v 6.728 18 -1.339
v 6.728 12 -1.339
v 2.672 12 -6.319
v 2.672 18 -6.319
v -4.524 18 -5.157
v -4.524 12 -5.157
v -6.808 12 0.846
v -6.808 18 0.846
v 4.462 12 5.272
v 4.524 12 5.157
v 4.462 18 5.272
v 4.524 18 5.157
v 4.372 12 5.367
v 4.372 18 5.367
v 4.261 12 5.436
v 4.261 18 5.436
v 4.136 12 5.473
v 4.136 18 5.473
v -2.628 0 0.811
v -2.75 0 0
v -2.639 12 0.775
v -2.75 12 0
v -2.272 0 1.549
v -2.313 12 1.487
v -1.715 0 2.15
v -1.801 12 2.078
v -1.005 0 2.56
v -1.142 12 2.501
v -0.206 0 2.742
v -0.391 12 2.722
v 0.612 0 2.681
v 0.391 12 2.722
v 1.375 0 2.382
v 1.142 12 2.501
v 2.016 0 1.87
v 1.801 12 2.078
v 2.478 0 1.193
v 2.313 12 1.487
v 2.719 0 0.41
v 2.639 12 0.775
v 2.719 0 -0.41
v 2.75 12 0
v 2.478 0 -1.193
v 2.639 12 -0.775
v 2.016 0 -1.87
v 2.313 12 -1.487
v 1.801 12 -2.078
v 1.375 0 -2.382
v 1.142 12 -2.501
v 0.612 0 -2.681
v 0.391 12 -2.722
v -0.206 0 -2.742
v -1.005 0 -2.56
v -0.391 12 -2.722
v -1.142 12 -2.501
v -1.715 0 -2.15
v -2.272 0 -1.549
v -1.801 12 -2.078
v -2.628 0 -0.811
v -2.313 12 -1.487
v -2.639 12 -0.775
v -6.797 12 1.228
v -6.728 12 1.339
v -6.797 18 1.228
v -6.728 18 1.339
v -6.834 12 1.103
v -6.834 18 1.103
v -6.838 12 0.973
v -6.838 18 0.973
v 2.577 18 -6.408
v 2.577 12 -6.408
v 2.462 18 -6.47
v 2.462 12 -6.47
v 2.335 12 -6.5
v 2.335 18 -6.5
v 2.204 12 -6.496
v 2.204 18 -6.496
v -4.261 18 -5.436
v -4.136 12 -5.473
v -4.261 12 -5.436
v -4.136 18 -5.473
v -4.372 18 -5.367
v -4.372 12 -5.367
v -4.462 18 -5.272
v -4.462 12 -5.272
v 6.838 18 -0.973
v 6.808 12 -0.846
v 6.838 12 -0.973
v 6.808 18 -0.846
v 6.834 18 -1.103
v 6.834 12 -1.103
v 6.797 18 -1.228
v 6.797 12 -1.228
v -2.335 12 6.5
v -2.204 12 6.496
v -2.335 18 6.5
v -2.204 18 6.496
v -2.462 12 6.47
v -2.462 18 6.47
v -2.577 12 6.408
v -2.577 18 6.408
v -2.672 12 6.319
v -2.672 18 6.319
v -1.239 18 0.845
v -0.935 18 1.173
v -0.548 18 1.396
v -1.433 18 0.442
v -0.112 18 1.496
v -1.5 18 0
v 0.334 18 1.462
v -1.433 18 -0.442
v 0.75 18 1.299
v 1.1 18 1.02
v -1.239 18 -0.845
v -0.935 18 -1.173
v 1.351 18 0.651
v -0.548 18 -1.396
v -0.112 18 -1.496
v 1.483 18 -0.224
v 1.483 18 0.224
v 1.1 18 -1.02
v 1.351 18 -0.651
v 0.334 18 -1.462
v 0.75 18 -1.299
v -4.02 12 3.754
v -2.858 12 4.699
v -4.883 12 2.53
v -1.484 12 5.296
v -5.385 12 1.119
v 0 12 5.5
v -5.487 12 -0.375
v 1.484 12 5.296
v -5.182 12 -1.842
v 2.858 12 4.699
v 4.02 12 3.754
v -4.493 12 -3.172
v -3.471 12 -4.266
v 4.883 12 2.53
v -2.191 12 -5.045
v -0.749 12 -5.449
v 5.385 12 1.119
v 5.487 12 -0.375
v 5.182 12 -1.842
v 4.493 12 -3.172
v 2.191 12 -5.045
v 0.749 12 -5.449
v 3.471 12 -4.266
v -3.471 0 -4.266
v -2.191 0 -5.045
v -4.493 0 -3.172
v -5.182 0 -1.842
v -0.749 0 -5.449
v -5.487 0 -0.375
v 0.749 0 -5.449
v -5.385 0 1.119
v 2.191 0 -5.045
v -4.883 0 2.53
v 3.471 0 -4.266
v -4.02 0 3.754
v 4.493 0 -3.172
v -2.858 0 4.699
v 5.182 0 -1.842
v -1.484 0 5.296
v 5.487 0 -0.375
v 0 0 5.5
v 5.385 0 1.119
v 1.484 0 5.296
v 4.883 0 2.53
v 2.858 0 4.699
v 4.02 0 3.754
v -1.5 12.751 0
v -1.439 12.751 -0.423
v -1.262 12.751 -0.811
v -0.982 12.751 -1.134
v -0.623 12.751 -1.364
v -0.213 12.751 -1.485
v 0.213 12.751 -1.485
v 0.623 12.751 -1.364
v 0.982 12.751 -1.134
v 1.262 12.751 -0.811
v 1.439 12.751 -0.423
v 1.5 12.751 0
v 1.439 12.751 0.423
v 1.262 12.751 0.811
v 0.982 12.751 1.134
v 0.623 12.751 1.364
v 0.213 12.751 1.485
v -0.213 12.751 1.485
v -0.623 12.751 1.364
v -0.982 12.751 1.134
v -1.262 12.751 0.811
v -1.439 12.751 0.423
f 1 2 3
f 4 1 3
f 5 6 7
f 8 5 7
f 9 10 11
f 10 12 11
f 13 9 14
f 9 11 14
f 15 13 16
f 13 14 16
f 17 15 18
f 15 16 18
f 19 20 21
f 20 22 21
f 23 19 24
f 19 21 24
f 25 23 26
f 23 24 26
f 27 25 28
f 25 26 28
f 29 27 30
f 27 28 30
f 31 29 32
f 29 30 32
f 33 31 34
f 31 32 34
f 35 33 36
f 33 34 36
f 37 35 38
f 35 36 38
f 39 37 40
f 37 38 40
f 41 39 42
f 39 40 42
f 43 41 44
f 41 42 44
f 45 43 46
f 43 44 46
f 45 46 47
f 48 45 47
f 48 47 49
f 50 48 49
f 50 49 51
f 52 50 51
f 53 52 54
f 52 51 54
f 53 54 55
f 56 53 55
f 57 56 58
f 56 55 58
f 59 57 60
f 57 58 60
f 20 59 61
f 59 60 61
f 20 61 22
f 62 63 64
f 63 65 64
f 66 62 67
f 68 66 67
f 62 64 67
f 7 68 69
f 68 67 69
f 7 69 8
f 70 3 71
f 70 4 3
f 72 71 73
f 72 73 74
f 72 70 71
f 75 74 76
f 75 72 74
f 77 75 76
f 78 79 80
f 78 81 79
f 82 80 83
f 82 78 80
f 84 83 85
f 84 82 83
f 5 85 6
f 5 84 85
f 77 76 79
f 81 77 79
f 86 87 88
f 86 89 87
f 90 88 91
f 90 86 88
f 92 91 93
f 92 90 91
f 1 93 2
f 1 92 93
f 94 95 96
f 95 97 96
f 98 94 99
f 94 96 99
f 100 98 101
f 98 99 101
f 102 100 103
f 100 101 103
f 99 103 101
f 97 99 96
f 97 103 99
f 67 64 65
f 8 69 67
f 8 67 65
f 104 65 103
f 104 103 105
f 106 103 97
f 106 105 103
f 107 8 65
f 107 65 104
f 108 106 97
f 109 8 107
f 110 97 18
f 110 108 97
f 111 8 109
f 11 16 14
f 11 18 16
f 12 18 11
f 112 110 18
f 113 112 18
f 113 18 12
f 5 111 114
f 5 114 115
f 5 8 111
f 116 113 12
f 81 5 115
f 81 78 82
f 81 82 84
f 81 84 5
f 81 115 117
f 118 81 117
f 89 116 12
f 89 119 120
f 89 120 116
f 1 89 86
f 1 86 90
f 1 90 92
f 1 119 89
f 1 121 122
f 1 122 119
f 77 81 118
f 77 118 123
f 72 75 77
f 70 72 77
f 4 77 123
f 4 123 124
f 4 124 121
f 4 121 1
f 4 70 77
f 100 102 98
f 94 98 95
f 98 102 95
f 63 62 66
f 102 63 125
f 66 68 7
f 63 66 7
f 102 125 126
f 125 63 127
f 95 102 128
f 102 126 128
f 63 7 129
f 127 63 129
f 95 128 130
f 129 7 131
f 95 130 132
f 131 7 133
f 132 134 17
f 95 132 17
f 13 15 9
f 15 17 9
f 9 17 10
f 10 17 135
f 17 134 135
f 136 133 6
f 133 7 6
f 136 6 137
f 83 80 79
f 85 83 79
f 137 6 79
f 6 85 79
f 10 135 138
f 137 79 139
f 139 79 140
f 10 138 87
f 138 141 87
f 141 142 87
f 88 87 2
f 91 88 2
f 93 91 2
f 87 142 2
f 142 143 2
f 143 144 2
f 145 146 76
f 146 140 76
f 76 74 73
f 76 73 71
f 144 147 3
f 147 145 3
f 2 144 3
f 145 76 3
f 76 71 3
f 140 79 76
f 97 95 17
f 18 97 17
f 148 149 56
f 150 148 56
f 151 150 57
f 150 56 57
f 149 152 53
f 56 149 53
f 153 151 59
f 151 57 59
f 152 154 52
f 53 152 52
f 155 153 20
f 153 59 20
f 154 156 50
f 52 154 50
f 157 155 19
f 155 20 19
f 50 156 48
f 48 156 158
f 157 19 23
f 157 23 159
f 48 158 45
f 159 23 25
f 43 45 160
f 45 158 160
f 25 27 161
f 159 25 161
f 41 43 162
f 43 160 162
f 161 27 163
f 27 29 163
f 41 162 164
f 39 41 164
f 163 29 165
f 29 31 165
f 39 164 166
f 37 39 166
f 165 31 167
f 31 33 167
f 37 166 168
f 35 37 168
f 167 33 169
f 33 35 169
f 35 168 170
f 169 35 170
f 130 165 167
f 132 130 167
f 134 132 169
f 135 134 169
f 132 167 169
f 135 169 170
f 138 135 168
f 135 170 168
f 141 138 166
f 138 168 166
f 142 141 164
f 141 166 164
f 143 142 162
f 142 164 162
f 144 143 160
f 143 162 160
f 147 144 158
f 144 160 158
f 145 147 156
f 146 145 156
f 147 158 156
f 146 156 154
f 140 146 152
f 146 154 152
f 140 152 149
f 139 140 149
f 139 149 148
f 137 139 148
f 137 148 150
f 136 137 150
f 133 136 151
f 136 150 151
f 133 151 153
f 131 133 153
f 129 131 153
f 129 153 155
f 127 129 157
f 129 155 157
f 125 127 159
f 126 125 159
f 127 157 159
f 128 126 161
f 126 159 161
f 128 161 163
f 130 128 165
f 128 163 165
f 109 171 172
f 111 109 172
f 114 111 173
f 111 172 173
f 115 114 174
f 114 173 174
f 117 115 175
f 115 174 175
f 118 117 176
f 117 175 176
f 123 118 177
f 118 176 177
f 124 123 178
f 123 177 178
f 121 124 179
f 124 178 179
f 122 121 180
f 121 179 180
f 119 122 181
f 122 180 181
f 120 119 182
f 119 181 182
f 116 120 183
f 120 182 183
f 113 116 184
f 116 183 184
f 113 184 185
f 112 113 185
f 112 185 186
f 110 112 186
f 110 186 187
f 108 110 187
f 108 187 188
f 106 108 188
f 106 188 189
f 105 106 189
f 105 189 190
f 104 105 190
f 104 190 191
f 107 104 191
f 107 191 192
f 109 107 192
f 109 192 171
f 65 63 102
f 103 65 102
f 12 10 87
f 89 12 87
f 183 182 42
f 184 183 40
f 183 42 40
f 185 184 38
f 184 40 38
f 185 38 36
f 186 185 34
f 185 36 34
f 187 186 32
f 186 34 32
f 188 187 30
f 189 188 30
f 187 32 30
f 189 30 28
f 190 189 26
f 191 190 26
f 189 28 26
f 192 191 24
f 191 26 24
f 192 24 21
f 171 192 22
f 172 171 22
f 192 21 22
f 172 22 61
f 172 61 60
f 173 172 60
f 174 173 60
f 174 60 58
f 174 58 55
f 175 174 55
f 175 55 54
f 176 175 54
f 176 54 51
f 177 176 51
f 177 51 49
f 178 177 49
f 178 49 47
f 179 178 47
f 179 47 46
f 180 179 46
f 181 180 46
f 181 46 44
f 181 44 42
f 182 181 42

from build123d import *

# Parameters (mm, degrees)
SKETCH1_R                    = 5.5
BOSS_EXTRUDE1_DEPTH          = 12
BOSS_EXTRUDE2_DEPTH          = 6
M5_CLEARANCE_HOLE1_D         = 5.5
M5_CLEARANCE_HOLE1_DEPTH     = 12
M5_CLEARANCE_HOLE1_TIP       = 1.652366702
F_3_0_3_DIAMETER_HOLE1_D     = 3
F_3_0_3_DIAMETER_HOLE1_DEPTH = 6
F_3_0_3_DIAMETER_HOLE1_TIP   = 0.901290929
FILLET1_R                    = 0.5


with BuildPart() as part:
    # Sketch1 → Boss-Extrude1 (new body)
    with BuildSketch(Plane(origin=(0, 0, 0), x_dir=(1, 0, 0), z_dir=(0, 1, 0))):
        with Locations(Location((0, 0, 0), (0, 0, 270))):
            Circle(SKETCH1_R)
    extrude(amount=BOSS_EXTRUDE1_DEPTH)

    # Sketch2 → Boss-Extrude2 (add)
    with BuildSketch(Plane(origin=(0, 12, 0), x_dir=(1, 0, 0), z_dir=(0, 1, 0))):
        Polygon((4.42120467, -5.427057146), (6.910571691, 1.115346986), (2.489367021, 6.542404132), (-4.42120467, 5.427057146), (-6.910571691, -1.115346986), (-2.489367021, -6.542404132), align=None)
    extrude(amount=BOSS_EXTRUDE2_DEPTH)

    # M5 Clearance Hole1
    with Locations(Plane.XZ):
        with Locations((0, 0)):
            Hole(M5_CLEARANCE_HOLE1_D / 2, depth=M5_CLEARANCE_HOLE1_DEPTH)
            with Locations((0, 0, -(M5_CLEARANCE_HOLE1_DEPTH + M5_CLEARANCE_HOLE1_TIP / 2))):  # 118° drill point
                Cone(0, M5_CLEARANCE_HOLE1_D / 2, M5_CLEARANCE_HOLE1_TIP, mode=Mode.SUBTRACT)

    # Ø3.0 (3) Diameter Hole1
    with Locations(Plane(origin=(0, 18, 0), x_dir=(1, 0, 0), z_dir=(0, 1, 0))):
        with Locations((0, 0)):
            Hole(F_3_0_3_DIAMETER_HOLE1_D / 2, depth=F_3_0_3_DIAMETER_HOLE1_DEPTH)
            with Locations((0, 0, -(F_3_0_3_DIAMETER_HOLE1_DEPTH + F_3_0_3_DIAMETER_HOLE1_TIP / 2))):  # 118° drill point
                Cone(0, F_3_0_3_DIAMETER_HOLE1_D / 2, F_3_0_3_DIAMETER_HOLE1_TIP, mode=Mode.SUBTRACT)

    # Fillet1
    fillet1_edges = [part.edges().sort_by_distance(p)[0] for p in [
        (-2.489367021, 15, 6.542404132),
        (4.42120467, 15, 5.427057146),
        (6.910571691, 15, -1.115346986),
        (2.489367021, 15, -6.542404132),
        (-4.42120467, 15, -5.427057146),
        (-6.910571691, 15, 1.115346986),
    ]]
    fillet(fillet1_edges, radius=FILLET1_R)


solid = part.part
